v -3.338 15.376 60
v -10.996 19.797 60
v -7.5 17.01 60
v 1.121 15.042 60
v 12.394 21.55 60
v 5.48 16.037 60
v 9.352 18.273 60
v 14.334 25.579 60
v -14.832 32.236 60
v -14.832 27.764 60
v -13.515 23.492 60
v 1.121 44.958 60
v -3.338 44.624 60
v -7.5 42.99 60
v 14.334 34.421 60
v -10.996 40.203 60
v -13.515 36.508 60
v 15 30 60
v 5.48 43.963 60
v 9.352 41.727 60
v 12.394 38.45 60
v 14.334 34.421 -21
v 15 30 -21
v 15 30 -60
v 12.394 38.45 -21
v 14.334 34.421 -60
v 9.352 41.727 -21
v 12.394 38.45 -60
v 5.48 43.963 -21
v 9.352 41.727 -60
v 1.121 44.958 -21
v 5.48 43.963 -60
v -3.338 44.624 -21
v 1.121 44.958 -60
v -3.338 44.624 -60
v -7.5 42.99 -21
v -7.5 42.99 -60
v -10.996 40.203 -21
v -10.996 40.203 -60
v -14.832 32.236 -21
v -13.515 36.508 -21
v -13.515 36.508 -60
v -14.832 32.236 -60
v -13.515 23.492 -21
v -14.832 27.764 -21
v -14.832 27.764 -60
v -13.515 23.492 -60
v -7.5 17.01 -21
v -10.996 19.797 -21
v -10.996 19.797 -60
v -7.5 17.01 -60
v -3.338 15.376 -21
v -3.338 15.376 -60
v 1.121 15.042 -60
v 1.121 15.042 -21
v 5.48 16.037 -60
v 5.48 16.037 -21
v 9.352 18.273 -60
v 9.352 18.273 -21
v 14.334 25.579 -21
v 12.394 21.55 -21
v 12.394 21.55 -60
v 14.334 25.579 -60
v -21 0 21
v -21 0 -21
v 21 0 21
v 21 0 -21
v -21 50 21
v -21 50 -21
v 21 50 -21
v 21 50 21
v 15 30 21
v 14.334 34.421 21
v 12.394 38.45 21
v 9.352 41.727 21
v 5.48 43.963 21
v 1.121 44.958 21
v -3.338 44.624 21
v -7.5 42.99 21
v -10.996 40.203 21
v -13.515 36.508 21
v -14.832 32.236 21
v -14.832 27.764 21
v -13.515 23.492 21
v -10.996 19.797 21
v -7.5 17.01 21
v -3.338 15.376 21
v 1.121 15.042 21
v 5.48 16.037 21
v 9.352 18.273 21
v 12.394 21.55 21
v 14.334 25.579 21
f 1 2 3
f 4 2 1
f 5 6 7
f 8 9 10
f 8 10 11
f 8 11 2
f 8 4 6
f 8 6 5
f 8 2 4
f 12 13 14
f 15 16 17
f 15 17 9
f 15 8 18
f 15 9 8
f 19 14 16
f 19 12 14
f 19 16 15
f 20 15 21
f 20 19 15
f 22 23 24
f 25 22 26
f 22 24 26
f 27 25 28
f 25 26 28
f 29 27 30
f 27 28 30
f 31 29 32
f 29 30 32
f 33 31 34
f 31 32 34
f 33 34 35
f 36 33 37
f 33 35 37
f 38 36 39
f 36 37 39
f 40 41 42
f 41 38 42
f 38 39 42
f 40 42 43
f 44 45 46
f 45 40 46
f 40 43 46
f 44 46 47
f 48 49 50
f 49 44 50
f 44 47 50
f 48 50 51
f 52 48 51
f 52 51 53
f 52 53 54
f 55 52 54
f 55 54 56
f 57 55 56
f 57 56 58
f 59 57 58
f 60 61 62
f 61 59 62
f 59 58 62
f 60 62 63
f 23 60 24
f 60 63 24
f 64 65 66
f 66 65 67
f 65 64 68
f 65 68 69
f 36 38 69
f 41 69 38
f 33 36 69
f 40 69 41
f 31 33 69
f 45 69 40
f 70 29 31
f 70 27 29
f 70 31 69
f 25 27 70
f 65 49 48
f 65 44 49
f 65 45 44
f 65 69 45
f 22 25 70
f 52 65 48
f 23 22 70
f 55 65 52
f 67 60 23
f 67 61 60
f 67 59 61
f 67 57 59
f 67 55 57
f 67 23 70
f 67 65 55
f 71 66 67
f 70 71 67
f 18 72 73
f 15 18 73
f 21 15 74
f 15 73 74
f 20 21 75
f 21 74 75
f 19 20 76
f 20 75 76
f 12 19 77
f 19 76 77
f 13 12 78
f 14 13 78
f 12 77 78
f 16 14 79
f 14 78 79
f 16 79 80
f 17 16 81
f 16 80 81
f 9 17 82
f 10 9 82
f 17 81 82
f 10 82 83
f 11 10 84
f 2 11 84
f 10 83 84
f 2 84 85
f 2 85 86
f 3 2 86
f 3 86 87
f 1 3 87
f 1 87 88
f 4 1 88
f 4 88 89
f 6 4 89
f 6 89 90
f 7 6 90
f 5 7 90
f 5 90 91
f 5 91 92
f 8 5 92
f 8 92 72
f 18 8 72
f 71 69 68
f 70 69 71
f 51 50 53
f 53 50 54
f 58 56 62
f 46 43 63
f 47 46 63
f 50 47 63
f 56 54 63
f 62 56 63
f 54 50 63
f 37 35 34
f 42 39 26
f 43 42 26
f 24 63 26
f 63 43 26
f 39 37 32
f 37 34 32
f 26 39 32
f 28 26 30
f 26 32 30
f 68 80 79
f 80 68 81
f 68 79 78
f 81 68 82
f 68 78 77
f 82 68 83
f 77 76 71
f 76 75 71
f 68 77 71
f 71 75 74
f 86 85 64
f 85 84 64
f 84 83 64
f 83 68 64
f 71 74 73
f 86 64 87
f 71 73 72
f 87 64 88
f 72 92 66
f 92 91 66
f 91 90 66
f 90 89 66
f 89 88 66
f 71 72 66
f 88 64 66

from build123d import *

# Parameters (mm, degrees)
SKETCH1_W                = 42
SKETCH1_H                = 42
BOSS_EXTRUDE1_DEPTH      = 50
BOSS_EXTRUDE2_DEPTH      = 60
BOSS_EXTRUDE2_DEPTH_BACK = 60
SKETCH2_R                = 15


with BuildPart() as part:
    # Sketch1 → Boss-Extrude1 (new body)
    with BuildSketch(Plane(origin=(0, 0, 0), x_dir=(1, 0, 0), z_dir=(0, 1, 0))):
        Rectangle(SKETCH1_W, SKETCH1_H)
    extrude(amount=BOSS_EXTRUDE1_DEPTH)

    # Sketch2 → Boss-Extrude2 (add, two sides: drawn at the far end of the back side and taken through both)
    with BuildSketch(Plane.XY.offset(-BOSS_EXTRUDE2_DEPTH_BACK)):
        with Locations((0, 30)):
            Circle(SKETCH2_R)
    extrude(amount=BOSS_EXTRUDE2_DEPTH + BOSS_EXTRUDE2_DEPTH_BACK)


solid = part.part
